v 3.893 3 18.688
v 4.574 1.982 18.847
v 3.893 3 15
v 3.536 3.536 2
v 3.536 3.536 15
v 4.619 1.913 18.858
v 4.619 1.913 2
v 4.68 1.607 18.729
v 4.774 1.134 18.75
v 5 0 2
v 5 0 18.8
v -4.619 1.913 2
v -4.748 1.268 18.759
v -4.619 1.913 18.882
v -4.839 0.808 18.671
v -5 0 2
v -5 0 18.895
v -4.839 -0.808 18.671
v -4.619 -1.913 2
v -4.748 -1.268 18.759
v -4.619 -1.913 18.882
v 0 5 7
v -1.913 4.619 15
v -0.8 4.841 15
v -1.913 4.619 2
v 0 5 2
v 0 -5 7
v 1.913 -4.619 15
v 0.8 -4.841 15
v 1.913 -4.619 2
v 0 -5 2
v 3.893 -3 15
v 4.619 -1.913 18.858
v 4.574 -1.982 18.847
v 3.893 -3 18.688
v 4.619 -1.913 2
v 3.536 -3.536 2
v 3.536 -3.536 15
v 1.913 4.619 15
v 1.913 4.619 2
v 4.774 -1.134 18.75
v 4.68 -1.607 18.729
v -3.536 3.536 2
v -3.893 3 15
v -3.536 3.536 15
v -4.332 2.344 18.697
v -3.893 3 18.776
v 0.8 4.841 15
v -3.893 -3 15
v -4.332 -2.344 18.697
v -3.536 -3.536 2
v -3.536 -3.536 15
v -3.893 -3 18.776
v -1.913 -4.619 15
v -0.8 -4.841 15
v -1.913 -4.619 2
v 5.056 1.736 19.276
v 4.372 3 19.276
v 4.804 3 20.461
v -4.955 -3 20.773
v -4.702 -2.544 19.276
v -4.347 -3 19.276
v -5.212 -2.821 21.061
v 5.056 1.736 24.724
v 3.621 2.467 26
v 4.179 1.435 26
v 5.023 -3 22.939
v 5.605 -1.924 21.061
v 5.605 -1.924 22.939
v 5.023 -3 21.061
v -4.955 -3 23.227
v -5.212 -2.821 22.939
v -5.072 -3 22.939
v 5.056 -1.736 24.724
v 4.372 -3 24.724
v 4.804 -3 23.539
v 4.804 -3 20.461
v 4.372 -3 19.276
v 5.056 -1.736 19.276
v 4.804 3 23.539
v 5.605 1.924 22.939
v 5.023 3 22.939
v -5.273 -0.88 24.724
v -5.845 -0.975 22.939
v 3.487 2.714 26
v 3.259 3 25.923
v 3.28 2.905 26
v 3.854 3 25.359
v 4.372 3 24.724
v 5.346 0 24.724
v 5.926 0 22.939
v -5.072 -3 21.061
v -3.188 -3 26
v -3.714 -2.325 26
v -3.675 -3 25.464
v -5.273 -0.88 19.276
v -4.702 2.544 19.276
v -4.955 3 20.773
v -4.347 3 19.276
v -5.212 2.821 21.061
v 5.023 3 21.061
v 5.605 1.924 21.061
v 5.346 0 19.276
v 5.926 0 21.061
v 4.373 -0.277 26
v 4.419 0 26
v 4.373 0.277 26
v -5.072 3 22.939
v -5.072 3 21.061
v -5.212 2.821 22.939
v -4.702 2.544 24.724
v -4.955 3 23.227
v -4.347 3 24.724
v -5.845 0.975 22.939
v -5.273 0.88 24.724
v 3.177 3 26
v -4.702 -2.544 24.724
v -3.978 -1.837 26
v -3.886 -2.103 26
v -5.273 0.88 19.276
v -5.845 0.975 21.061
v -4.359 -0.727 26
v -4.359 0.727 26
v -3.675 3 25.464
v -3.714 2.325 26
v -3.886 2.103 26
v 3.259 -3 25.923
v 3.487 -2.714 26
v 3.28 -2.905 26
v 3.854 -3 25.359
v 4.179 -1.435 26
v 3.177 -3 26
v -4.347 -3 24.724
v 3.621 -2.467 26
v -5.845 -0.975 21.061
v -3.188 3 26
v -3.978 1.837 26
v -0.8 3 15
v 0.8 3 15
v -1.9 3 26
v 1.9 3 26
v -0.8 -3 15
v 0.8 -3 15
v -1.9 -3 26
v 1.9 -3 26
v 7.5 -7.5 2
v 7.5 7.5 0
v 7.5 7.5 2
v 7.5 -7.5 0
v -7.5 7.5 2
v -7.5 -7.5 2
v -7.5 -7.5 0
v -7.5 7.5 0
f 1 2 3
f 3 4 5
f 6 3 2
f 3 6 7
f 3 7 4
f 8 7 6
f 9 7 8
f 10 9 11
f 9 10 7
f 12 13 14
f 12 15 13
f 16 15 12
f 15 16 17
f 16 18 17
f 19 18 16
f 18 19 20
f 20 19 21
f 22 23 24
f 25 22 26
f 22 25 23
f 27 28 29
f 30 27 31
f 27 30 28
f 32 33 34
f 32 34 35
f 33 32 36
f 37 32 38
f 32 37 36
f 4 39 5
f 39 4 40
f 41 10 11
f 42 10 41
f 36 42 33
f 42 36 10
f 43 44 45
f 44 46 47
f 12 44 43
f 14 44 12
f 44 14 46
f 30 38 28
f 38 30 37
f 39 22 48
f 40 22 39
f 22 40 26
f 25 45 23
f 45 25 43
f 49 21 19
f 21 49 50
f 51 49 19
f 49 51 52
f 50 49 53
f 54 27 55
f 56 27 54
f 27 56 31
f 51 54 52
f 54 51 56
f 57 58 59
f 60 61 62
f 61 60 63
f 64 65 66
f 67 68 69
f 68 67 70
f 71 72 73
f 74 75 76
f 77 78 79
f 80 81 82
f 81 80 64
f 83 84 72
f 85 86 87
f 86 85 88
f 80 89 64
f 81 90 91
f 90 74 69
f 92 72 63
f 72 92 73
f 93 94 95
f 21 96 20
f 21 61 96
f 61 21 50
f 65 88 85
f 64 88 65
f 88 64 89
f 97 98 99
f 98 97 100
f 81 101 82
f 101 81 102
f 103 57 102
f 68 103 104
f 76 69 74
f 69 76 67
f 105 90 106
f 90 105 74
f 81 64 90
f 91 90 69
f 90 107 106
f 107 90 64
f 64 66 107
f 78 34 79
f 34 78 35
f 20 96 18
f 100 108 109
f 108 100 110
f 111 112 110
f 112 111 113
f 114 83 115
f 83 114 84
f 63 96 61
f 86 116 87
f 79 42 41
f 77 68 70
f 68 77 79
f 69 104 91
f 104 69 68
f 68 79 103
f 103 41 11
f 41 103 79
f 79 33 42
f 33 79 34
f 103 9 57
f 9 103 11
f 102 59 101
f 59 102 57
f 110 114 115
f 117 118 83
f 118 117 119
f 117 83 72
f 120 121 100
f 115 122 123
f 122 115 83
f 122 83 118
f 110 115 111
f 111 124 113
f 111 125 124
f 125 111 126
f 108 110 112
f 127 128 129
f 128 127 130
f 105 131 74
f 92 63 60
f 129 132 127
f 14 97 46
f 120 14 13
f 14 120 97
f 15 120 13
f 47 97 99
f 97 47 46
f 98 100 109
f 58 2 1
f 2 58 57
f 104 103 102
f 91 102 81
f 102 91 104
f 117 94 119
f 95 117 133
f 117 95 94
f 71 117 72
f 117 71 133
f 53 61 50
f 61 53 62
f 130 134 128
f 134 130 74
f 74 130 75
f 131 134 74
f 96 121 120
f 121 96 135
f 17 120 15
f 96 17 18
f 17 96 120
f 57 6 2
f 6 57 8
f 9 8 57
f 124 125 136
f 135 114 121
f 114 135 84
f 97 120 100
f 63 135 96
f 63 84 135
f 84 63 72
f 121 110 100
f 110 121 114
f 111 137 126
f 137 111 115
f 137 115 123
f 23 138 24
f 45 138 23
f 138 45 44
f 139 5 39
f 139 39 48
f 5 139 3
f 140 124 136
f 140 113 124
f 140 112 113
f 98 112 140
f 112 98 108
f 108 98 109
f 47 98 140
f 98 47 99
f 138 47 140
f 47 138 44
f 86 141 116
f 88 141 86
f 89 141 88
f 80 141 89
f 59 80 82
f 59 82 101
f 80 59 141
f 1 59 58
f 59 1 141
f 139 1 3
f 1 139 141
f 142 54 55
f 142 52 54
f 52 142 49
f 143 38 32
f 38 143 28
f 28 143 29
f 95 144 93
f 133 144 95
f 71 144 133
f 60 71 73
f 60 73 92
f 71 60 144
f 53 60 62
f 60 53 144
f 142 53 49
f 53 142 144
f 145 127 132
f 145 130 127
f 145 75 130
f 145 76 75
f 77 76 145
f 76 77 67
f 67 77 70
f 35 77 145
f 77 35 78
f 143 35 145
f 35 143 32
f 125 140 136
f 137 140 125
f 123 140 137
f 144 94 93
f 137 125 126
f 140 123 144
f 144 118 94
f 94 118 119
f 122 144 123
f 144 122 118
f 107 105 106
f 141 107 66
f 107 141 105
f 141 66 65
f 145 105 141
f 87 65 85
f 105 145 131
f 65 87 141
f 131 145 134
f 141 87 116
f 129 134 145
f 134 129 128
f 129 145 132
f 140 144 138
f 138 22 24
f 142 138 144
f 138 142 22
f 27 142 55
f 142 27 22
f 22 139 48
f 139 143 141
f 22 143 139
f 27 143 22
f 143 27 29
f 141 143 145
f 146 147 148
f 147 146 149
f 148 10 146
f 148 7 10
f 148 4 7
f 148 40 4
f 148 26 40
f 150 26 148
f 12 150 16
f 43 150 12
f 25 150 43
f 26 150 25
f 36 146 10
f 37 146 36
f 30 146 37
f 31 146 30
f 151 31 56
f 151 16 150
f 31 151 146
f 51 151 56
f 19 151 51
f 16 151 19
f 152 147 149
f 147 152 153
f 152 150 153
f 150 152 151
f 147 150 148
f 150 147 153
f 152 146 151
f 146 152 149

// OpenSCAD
module pinshape(r=5,bellend=6,h=20) {
	union() {
		cylinder(r=r,h=h);
		translate([0,0,h]) sphere(r = bellend);
		}
}


module pin (h=20) {
	difference () {
		pinshape(h=h);
		translate([-10,3,h-7]) cube([20,10,30]);
		translate([-10,-13,h-7]) cube([20,10,30]);
		translate([-10,-10,h+4]) cube([20,20,10]);
		translate([0,10,6]) rotate([90, 0, 0]) linear_extrude(height=20) polygon(points=[[0,0],[-10,100],[10,100]],paths=[ [0,1,2] ]);
	}
}

module pinhole (h=20) {
		pinshape(r=5.25,bellend=6.25,h=h);
}

union () {
	translate([0,0,1]) pin(h=21);
	translate([-7.5,-7.5,0]) cube([15,15,2]);
}

/*
translate([18,0,27.25]) rotate([0,180,0]) difference () {
	cylinder(r=7.25, h=27.27);
	translate([0,0,-1]) pinhole();
}
*/
